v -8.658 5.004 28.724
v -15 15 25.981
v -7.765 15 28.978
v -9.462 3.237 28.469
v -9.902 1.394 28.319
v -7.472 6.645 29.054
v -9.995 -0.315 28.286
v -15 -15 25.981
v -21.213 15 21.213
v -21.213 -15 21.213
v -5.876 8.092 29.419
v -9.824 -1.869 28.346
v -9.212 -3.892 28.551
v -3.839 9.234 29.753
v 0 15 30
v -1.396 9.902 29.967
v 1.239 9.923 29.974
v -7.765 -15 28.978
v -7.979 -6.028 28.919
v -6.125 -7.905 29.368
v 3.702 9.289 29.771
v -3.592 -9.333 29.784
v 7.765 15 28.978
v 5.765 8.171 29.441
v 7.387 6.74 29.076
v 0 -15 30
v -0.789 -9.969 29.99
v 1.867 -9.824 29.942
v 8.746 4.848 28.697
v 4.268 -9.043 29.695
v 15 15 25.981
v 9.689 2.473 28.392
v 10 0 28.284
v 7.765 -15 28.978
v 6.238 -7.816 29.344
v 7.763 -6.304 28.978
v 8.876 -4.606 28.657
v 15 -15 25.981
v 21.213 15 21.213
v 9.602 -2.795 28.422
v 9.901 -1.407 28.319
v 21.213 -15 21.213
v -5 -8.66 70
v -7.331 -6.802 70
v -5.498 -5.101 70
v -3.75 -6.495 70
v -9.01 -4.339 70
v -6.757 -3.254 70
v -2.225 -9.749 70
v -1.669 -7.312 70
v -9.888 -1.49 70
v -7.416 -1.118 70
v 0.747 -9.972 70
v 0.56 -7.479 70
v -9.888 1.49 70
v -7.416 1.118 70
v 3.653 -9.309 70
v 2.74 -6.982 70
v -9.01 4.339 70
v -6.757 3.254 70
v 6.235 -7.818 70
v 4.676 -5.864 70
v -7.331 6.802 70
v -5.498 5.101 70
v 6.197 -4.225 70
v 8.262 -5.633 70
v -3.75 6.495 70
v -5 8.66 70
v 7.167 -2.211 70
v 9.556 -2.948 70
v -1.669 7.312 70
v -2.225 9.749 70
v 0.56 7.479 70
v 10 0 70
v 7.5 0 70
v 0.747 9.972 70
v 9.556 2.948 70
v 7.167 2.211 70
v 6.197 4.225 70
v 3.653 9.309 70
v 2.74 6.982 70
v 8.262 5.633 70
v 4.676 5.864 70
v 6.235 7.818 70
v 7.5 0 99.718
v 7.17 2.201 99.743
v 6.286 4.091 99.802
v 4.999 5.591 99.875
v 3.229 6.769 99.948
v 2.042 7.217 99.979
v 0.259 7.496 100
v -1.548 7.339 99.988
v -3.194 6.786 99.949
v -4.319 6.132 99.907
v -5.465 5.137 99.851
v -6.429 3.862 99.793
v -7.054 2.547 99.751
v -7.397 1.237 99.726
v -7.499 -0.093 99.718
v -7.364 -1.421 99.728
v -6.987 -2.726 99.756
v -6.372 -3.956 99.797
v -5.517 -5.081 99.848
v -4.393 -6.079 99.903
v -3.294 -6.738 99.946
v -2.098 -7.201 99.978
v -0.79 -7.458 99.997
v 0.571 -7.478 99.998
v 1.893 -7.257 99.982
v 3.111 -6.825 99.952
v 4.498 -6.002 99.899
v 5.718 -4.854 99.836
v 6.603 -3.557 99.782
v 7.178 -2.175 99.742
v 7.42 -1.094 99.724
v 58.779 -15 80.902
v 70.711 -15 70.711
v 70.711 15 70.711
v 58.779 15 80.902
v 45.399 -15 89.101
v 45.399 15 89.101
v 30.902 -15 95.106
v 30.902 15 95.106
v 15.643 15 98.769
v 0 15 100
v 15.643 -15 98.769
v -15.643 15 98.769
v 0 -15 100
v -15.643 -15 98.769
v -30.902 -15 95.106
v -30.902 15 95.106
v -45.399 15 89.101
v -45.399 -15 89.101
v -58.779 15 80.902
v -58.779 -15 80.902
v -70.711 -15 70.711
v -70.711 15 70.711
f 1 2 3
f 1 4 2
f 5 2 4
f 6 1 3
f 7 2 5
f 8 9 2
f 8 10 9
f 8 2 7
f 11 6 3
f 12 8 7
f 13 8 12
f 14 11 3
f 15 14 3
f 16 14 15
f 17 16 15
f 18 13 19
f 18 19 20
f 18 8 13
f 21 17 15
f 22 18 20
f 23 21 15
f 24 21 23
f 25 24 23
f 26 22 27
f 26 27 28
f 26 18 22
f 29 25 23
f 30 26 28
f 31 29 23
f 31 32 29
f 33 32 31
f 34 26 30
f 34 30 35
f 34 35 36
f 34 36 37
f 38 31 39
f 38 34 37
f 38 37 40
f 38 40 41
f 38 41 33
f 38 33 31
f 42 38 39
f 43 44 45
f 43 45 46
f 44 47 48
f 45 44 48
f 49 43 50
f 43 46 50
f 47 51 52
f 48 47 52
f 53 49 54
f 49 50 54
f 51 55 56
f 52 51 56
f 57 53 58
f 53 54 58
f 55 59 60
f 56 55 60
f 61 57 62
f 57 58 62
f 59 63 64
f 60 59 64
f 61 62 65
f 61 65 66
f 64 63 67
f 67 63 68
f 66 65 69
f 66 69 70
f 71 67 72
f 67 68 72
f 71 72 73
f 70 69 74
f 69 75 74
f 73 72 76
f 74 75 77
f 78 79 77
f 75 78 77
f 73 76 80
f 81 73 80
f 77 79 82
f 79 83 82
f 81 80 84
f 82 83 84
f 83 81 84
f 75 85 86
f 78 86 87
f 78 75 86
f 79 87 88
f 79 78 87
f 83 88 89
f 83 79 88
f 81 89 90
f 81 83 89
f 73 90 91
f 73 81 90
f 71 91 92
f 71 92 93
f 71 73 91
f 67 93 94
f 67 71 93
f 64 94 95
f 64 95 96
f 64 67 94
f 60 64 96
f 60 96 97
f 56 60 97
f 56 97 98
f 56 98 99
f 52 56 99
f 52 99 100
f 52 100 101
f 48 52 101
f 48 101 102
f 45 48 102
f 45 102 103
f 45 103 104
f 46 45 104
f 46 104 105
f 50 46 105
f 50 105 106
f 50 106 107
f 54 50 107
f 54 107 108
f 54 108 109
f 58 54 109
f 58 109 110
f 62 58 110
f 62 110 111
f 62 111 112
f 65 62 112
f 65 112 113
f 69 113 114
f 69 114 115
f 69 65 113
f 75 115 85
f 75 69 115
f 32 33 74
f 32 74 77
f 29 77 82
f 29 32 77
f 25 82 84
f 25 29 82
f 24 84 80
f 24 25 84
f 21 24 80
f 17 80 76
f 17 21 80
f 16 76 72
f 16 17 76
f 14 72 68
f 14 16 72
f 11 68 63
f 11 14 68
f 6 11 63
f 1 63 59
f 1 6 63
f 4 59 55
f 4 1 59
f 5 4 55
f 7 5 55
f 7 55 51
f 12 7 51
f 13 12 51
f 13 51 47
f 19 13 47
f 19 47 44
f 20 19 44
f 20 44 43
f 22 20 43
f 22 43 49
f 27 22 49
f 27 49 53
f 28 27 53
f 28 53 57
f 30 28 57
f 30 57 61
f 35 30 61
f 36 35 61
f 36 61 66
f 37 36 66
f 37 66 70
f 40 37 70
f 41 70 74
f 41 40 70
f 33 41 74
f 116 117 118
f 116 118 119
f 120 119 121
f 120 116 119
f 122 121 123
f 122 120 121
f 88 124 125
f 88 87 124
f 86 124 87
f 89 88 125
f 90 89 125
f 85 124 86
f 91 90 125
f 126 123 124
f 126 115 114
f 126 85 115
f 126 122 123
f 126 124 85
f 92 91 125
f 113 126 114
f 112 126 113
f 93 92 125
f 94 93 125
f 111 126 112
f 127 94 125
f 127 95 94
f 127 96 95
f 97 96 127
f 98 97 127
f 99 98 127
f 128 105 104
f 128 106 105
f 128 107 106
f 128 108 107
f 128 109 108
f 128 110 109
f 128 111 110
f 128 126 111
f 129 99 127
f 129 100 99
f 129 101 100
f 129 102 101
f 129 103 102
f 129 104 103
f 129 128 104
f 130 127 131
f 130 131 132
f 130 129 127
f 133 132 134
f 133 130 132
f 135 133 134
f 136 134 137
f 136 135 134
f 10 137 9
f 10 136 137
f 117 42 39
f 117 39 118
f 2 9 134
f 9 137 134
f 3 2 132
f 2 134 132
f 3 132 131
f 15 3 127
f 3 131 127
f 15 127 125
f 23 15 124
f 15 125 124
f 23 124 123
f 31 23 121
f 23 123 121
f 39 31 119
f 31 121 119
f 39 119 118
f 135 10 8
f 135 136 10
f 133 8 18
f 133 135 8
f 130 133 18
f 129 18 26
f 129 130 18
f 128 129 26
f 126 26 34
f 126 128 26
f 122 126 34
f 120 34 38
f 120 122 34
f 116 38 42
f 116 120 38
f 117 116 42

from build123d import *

# Parameters (mm, degrees)
F1_DEPTH = 15
F2_R     = 7.5
F3_DEPTH = 200.658232
F4_R     = 10
F5_DEPTH = 70


with BuildPart() as f1:
    # F0 (on Front) → F1 (new body, symmetric)
    with BuildSketch(Plane.XZ):
        with BuildLine():
            ThreePointArc((-21.213203, 21.213203), (0, 30), (21.213203, 21.213203))
            Line((21.213203, 21.213203), (70.710678, 70.710678))
            ThreePointArc((70.710678, 70.710678), (0, 100), (-70.710678, 70.710678))
            Line((-70.710678, 70.710678), (-21.213203, 21.213203))
        make_face()
    extrude(amount=F1_DEPTH, both=True)

    # F2 (on Top) → F3 (cut)
    with BuildSketch(Plane.XY):
        Circle(F2_R)
    extrude(amount=F3_DEPTH, mode=Mode.SUBTRACT)

    # F4 (on Top) → F5 (cut)
    with BuildSketch(Plane.XY):
        Circle(F4_R)
    extrude(amount=F5_DEPTH, mode=Mode.SUBTRACT)


solid = f1.part
